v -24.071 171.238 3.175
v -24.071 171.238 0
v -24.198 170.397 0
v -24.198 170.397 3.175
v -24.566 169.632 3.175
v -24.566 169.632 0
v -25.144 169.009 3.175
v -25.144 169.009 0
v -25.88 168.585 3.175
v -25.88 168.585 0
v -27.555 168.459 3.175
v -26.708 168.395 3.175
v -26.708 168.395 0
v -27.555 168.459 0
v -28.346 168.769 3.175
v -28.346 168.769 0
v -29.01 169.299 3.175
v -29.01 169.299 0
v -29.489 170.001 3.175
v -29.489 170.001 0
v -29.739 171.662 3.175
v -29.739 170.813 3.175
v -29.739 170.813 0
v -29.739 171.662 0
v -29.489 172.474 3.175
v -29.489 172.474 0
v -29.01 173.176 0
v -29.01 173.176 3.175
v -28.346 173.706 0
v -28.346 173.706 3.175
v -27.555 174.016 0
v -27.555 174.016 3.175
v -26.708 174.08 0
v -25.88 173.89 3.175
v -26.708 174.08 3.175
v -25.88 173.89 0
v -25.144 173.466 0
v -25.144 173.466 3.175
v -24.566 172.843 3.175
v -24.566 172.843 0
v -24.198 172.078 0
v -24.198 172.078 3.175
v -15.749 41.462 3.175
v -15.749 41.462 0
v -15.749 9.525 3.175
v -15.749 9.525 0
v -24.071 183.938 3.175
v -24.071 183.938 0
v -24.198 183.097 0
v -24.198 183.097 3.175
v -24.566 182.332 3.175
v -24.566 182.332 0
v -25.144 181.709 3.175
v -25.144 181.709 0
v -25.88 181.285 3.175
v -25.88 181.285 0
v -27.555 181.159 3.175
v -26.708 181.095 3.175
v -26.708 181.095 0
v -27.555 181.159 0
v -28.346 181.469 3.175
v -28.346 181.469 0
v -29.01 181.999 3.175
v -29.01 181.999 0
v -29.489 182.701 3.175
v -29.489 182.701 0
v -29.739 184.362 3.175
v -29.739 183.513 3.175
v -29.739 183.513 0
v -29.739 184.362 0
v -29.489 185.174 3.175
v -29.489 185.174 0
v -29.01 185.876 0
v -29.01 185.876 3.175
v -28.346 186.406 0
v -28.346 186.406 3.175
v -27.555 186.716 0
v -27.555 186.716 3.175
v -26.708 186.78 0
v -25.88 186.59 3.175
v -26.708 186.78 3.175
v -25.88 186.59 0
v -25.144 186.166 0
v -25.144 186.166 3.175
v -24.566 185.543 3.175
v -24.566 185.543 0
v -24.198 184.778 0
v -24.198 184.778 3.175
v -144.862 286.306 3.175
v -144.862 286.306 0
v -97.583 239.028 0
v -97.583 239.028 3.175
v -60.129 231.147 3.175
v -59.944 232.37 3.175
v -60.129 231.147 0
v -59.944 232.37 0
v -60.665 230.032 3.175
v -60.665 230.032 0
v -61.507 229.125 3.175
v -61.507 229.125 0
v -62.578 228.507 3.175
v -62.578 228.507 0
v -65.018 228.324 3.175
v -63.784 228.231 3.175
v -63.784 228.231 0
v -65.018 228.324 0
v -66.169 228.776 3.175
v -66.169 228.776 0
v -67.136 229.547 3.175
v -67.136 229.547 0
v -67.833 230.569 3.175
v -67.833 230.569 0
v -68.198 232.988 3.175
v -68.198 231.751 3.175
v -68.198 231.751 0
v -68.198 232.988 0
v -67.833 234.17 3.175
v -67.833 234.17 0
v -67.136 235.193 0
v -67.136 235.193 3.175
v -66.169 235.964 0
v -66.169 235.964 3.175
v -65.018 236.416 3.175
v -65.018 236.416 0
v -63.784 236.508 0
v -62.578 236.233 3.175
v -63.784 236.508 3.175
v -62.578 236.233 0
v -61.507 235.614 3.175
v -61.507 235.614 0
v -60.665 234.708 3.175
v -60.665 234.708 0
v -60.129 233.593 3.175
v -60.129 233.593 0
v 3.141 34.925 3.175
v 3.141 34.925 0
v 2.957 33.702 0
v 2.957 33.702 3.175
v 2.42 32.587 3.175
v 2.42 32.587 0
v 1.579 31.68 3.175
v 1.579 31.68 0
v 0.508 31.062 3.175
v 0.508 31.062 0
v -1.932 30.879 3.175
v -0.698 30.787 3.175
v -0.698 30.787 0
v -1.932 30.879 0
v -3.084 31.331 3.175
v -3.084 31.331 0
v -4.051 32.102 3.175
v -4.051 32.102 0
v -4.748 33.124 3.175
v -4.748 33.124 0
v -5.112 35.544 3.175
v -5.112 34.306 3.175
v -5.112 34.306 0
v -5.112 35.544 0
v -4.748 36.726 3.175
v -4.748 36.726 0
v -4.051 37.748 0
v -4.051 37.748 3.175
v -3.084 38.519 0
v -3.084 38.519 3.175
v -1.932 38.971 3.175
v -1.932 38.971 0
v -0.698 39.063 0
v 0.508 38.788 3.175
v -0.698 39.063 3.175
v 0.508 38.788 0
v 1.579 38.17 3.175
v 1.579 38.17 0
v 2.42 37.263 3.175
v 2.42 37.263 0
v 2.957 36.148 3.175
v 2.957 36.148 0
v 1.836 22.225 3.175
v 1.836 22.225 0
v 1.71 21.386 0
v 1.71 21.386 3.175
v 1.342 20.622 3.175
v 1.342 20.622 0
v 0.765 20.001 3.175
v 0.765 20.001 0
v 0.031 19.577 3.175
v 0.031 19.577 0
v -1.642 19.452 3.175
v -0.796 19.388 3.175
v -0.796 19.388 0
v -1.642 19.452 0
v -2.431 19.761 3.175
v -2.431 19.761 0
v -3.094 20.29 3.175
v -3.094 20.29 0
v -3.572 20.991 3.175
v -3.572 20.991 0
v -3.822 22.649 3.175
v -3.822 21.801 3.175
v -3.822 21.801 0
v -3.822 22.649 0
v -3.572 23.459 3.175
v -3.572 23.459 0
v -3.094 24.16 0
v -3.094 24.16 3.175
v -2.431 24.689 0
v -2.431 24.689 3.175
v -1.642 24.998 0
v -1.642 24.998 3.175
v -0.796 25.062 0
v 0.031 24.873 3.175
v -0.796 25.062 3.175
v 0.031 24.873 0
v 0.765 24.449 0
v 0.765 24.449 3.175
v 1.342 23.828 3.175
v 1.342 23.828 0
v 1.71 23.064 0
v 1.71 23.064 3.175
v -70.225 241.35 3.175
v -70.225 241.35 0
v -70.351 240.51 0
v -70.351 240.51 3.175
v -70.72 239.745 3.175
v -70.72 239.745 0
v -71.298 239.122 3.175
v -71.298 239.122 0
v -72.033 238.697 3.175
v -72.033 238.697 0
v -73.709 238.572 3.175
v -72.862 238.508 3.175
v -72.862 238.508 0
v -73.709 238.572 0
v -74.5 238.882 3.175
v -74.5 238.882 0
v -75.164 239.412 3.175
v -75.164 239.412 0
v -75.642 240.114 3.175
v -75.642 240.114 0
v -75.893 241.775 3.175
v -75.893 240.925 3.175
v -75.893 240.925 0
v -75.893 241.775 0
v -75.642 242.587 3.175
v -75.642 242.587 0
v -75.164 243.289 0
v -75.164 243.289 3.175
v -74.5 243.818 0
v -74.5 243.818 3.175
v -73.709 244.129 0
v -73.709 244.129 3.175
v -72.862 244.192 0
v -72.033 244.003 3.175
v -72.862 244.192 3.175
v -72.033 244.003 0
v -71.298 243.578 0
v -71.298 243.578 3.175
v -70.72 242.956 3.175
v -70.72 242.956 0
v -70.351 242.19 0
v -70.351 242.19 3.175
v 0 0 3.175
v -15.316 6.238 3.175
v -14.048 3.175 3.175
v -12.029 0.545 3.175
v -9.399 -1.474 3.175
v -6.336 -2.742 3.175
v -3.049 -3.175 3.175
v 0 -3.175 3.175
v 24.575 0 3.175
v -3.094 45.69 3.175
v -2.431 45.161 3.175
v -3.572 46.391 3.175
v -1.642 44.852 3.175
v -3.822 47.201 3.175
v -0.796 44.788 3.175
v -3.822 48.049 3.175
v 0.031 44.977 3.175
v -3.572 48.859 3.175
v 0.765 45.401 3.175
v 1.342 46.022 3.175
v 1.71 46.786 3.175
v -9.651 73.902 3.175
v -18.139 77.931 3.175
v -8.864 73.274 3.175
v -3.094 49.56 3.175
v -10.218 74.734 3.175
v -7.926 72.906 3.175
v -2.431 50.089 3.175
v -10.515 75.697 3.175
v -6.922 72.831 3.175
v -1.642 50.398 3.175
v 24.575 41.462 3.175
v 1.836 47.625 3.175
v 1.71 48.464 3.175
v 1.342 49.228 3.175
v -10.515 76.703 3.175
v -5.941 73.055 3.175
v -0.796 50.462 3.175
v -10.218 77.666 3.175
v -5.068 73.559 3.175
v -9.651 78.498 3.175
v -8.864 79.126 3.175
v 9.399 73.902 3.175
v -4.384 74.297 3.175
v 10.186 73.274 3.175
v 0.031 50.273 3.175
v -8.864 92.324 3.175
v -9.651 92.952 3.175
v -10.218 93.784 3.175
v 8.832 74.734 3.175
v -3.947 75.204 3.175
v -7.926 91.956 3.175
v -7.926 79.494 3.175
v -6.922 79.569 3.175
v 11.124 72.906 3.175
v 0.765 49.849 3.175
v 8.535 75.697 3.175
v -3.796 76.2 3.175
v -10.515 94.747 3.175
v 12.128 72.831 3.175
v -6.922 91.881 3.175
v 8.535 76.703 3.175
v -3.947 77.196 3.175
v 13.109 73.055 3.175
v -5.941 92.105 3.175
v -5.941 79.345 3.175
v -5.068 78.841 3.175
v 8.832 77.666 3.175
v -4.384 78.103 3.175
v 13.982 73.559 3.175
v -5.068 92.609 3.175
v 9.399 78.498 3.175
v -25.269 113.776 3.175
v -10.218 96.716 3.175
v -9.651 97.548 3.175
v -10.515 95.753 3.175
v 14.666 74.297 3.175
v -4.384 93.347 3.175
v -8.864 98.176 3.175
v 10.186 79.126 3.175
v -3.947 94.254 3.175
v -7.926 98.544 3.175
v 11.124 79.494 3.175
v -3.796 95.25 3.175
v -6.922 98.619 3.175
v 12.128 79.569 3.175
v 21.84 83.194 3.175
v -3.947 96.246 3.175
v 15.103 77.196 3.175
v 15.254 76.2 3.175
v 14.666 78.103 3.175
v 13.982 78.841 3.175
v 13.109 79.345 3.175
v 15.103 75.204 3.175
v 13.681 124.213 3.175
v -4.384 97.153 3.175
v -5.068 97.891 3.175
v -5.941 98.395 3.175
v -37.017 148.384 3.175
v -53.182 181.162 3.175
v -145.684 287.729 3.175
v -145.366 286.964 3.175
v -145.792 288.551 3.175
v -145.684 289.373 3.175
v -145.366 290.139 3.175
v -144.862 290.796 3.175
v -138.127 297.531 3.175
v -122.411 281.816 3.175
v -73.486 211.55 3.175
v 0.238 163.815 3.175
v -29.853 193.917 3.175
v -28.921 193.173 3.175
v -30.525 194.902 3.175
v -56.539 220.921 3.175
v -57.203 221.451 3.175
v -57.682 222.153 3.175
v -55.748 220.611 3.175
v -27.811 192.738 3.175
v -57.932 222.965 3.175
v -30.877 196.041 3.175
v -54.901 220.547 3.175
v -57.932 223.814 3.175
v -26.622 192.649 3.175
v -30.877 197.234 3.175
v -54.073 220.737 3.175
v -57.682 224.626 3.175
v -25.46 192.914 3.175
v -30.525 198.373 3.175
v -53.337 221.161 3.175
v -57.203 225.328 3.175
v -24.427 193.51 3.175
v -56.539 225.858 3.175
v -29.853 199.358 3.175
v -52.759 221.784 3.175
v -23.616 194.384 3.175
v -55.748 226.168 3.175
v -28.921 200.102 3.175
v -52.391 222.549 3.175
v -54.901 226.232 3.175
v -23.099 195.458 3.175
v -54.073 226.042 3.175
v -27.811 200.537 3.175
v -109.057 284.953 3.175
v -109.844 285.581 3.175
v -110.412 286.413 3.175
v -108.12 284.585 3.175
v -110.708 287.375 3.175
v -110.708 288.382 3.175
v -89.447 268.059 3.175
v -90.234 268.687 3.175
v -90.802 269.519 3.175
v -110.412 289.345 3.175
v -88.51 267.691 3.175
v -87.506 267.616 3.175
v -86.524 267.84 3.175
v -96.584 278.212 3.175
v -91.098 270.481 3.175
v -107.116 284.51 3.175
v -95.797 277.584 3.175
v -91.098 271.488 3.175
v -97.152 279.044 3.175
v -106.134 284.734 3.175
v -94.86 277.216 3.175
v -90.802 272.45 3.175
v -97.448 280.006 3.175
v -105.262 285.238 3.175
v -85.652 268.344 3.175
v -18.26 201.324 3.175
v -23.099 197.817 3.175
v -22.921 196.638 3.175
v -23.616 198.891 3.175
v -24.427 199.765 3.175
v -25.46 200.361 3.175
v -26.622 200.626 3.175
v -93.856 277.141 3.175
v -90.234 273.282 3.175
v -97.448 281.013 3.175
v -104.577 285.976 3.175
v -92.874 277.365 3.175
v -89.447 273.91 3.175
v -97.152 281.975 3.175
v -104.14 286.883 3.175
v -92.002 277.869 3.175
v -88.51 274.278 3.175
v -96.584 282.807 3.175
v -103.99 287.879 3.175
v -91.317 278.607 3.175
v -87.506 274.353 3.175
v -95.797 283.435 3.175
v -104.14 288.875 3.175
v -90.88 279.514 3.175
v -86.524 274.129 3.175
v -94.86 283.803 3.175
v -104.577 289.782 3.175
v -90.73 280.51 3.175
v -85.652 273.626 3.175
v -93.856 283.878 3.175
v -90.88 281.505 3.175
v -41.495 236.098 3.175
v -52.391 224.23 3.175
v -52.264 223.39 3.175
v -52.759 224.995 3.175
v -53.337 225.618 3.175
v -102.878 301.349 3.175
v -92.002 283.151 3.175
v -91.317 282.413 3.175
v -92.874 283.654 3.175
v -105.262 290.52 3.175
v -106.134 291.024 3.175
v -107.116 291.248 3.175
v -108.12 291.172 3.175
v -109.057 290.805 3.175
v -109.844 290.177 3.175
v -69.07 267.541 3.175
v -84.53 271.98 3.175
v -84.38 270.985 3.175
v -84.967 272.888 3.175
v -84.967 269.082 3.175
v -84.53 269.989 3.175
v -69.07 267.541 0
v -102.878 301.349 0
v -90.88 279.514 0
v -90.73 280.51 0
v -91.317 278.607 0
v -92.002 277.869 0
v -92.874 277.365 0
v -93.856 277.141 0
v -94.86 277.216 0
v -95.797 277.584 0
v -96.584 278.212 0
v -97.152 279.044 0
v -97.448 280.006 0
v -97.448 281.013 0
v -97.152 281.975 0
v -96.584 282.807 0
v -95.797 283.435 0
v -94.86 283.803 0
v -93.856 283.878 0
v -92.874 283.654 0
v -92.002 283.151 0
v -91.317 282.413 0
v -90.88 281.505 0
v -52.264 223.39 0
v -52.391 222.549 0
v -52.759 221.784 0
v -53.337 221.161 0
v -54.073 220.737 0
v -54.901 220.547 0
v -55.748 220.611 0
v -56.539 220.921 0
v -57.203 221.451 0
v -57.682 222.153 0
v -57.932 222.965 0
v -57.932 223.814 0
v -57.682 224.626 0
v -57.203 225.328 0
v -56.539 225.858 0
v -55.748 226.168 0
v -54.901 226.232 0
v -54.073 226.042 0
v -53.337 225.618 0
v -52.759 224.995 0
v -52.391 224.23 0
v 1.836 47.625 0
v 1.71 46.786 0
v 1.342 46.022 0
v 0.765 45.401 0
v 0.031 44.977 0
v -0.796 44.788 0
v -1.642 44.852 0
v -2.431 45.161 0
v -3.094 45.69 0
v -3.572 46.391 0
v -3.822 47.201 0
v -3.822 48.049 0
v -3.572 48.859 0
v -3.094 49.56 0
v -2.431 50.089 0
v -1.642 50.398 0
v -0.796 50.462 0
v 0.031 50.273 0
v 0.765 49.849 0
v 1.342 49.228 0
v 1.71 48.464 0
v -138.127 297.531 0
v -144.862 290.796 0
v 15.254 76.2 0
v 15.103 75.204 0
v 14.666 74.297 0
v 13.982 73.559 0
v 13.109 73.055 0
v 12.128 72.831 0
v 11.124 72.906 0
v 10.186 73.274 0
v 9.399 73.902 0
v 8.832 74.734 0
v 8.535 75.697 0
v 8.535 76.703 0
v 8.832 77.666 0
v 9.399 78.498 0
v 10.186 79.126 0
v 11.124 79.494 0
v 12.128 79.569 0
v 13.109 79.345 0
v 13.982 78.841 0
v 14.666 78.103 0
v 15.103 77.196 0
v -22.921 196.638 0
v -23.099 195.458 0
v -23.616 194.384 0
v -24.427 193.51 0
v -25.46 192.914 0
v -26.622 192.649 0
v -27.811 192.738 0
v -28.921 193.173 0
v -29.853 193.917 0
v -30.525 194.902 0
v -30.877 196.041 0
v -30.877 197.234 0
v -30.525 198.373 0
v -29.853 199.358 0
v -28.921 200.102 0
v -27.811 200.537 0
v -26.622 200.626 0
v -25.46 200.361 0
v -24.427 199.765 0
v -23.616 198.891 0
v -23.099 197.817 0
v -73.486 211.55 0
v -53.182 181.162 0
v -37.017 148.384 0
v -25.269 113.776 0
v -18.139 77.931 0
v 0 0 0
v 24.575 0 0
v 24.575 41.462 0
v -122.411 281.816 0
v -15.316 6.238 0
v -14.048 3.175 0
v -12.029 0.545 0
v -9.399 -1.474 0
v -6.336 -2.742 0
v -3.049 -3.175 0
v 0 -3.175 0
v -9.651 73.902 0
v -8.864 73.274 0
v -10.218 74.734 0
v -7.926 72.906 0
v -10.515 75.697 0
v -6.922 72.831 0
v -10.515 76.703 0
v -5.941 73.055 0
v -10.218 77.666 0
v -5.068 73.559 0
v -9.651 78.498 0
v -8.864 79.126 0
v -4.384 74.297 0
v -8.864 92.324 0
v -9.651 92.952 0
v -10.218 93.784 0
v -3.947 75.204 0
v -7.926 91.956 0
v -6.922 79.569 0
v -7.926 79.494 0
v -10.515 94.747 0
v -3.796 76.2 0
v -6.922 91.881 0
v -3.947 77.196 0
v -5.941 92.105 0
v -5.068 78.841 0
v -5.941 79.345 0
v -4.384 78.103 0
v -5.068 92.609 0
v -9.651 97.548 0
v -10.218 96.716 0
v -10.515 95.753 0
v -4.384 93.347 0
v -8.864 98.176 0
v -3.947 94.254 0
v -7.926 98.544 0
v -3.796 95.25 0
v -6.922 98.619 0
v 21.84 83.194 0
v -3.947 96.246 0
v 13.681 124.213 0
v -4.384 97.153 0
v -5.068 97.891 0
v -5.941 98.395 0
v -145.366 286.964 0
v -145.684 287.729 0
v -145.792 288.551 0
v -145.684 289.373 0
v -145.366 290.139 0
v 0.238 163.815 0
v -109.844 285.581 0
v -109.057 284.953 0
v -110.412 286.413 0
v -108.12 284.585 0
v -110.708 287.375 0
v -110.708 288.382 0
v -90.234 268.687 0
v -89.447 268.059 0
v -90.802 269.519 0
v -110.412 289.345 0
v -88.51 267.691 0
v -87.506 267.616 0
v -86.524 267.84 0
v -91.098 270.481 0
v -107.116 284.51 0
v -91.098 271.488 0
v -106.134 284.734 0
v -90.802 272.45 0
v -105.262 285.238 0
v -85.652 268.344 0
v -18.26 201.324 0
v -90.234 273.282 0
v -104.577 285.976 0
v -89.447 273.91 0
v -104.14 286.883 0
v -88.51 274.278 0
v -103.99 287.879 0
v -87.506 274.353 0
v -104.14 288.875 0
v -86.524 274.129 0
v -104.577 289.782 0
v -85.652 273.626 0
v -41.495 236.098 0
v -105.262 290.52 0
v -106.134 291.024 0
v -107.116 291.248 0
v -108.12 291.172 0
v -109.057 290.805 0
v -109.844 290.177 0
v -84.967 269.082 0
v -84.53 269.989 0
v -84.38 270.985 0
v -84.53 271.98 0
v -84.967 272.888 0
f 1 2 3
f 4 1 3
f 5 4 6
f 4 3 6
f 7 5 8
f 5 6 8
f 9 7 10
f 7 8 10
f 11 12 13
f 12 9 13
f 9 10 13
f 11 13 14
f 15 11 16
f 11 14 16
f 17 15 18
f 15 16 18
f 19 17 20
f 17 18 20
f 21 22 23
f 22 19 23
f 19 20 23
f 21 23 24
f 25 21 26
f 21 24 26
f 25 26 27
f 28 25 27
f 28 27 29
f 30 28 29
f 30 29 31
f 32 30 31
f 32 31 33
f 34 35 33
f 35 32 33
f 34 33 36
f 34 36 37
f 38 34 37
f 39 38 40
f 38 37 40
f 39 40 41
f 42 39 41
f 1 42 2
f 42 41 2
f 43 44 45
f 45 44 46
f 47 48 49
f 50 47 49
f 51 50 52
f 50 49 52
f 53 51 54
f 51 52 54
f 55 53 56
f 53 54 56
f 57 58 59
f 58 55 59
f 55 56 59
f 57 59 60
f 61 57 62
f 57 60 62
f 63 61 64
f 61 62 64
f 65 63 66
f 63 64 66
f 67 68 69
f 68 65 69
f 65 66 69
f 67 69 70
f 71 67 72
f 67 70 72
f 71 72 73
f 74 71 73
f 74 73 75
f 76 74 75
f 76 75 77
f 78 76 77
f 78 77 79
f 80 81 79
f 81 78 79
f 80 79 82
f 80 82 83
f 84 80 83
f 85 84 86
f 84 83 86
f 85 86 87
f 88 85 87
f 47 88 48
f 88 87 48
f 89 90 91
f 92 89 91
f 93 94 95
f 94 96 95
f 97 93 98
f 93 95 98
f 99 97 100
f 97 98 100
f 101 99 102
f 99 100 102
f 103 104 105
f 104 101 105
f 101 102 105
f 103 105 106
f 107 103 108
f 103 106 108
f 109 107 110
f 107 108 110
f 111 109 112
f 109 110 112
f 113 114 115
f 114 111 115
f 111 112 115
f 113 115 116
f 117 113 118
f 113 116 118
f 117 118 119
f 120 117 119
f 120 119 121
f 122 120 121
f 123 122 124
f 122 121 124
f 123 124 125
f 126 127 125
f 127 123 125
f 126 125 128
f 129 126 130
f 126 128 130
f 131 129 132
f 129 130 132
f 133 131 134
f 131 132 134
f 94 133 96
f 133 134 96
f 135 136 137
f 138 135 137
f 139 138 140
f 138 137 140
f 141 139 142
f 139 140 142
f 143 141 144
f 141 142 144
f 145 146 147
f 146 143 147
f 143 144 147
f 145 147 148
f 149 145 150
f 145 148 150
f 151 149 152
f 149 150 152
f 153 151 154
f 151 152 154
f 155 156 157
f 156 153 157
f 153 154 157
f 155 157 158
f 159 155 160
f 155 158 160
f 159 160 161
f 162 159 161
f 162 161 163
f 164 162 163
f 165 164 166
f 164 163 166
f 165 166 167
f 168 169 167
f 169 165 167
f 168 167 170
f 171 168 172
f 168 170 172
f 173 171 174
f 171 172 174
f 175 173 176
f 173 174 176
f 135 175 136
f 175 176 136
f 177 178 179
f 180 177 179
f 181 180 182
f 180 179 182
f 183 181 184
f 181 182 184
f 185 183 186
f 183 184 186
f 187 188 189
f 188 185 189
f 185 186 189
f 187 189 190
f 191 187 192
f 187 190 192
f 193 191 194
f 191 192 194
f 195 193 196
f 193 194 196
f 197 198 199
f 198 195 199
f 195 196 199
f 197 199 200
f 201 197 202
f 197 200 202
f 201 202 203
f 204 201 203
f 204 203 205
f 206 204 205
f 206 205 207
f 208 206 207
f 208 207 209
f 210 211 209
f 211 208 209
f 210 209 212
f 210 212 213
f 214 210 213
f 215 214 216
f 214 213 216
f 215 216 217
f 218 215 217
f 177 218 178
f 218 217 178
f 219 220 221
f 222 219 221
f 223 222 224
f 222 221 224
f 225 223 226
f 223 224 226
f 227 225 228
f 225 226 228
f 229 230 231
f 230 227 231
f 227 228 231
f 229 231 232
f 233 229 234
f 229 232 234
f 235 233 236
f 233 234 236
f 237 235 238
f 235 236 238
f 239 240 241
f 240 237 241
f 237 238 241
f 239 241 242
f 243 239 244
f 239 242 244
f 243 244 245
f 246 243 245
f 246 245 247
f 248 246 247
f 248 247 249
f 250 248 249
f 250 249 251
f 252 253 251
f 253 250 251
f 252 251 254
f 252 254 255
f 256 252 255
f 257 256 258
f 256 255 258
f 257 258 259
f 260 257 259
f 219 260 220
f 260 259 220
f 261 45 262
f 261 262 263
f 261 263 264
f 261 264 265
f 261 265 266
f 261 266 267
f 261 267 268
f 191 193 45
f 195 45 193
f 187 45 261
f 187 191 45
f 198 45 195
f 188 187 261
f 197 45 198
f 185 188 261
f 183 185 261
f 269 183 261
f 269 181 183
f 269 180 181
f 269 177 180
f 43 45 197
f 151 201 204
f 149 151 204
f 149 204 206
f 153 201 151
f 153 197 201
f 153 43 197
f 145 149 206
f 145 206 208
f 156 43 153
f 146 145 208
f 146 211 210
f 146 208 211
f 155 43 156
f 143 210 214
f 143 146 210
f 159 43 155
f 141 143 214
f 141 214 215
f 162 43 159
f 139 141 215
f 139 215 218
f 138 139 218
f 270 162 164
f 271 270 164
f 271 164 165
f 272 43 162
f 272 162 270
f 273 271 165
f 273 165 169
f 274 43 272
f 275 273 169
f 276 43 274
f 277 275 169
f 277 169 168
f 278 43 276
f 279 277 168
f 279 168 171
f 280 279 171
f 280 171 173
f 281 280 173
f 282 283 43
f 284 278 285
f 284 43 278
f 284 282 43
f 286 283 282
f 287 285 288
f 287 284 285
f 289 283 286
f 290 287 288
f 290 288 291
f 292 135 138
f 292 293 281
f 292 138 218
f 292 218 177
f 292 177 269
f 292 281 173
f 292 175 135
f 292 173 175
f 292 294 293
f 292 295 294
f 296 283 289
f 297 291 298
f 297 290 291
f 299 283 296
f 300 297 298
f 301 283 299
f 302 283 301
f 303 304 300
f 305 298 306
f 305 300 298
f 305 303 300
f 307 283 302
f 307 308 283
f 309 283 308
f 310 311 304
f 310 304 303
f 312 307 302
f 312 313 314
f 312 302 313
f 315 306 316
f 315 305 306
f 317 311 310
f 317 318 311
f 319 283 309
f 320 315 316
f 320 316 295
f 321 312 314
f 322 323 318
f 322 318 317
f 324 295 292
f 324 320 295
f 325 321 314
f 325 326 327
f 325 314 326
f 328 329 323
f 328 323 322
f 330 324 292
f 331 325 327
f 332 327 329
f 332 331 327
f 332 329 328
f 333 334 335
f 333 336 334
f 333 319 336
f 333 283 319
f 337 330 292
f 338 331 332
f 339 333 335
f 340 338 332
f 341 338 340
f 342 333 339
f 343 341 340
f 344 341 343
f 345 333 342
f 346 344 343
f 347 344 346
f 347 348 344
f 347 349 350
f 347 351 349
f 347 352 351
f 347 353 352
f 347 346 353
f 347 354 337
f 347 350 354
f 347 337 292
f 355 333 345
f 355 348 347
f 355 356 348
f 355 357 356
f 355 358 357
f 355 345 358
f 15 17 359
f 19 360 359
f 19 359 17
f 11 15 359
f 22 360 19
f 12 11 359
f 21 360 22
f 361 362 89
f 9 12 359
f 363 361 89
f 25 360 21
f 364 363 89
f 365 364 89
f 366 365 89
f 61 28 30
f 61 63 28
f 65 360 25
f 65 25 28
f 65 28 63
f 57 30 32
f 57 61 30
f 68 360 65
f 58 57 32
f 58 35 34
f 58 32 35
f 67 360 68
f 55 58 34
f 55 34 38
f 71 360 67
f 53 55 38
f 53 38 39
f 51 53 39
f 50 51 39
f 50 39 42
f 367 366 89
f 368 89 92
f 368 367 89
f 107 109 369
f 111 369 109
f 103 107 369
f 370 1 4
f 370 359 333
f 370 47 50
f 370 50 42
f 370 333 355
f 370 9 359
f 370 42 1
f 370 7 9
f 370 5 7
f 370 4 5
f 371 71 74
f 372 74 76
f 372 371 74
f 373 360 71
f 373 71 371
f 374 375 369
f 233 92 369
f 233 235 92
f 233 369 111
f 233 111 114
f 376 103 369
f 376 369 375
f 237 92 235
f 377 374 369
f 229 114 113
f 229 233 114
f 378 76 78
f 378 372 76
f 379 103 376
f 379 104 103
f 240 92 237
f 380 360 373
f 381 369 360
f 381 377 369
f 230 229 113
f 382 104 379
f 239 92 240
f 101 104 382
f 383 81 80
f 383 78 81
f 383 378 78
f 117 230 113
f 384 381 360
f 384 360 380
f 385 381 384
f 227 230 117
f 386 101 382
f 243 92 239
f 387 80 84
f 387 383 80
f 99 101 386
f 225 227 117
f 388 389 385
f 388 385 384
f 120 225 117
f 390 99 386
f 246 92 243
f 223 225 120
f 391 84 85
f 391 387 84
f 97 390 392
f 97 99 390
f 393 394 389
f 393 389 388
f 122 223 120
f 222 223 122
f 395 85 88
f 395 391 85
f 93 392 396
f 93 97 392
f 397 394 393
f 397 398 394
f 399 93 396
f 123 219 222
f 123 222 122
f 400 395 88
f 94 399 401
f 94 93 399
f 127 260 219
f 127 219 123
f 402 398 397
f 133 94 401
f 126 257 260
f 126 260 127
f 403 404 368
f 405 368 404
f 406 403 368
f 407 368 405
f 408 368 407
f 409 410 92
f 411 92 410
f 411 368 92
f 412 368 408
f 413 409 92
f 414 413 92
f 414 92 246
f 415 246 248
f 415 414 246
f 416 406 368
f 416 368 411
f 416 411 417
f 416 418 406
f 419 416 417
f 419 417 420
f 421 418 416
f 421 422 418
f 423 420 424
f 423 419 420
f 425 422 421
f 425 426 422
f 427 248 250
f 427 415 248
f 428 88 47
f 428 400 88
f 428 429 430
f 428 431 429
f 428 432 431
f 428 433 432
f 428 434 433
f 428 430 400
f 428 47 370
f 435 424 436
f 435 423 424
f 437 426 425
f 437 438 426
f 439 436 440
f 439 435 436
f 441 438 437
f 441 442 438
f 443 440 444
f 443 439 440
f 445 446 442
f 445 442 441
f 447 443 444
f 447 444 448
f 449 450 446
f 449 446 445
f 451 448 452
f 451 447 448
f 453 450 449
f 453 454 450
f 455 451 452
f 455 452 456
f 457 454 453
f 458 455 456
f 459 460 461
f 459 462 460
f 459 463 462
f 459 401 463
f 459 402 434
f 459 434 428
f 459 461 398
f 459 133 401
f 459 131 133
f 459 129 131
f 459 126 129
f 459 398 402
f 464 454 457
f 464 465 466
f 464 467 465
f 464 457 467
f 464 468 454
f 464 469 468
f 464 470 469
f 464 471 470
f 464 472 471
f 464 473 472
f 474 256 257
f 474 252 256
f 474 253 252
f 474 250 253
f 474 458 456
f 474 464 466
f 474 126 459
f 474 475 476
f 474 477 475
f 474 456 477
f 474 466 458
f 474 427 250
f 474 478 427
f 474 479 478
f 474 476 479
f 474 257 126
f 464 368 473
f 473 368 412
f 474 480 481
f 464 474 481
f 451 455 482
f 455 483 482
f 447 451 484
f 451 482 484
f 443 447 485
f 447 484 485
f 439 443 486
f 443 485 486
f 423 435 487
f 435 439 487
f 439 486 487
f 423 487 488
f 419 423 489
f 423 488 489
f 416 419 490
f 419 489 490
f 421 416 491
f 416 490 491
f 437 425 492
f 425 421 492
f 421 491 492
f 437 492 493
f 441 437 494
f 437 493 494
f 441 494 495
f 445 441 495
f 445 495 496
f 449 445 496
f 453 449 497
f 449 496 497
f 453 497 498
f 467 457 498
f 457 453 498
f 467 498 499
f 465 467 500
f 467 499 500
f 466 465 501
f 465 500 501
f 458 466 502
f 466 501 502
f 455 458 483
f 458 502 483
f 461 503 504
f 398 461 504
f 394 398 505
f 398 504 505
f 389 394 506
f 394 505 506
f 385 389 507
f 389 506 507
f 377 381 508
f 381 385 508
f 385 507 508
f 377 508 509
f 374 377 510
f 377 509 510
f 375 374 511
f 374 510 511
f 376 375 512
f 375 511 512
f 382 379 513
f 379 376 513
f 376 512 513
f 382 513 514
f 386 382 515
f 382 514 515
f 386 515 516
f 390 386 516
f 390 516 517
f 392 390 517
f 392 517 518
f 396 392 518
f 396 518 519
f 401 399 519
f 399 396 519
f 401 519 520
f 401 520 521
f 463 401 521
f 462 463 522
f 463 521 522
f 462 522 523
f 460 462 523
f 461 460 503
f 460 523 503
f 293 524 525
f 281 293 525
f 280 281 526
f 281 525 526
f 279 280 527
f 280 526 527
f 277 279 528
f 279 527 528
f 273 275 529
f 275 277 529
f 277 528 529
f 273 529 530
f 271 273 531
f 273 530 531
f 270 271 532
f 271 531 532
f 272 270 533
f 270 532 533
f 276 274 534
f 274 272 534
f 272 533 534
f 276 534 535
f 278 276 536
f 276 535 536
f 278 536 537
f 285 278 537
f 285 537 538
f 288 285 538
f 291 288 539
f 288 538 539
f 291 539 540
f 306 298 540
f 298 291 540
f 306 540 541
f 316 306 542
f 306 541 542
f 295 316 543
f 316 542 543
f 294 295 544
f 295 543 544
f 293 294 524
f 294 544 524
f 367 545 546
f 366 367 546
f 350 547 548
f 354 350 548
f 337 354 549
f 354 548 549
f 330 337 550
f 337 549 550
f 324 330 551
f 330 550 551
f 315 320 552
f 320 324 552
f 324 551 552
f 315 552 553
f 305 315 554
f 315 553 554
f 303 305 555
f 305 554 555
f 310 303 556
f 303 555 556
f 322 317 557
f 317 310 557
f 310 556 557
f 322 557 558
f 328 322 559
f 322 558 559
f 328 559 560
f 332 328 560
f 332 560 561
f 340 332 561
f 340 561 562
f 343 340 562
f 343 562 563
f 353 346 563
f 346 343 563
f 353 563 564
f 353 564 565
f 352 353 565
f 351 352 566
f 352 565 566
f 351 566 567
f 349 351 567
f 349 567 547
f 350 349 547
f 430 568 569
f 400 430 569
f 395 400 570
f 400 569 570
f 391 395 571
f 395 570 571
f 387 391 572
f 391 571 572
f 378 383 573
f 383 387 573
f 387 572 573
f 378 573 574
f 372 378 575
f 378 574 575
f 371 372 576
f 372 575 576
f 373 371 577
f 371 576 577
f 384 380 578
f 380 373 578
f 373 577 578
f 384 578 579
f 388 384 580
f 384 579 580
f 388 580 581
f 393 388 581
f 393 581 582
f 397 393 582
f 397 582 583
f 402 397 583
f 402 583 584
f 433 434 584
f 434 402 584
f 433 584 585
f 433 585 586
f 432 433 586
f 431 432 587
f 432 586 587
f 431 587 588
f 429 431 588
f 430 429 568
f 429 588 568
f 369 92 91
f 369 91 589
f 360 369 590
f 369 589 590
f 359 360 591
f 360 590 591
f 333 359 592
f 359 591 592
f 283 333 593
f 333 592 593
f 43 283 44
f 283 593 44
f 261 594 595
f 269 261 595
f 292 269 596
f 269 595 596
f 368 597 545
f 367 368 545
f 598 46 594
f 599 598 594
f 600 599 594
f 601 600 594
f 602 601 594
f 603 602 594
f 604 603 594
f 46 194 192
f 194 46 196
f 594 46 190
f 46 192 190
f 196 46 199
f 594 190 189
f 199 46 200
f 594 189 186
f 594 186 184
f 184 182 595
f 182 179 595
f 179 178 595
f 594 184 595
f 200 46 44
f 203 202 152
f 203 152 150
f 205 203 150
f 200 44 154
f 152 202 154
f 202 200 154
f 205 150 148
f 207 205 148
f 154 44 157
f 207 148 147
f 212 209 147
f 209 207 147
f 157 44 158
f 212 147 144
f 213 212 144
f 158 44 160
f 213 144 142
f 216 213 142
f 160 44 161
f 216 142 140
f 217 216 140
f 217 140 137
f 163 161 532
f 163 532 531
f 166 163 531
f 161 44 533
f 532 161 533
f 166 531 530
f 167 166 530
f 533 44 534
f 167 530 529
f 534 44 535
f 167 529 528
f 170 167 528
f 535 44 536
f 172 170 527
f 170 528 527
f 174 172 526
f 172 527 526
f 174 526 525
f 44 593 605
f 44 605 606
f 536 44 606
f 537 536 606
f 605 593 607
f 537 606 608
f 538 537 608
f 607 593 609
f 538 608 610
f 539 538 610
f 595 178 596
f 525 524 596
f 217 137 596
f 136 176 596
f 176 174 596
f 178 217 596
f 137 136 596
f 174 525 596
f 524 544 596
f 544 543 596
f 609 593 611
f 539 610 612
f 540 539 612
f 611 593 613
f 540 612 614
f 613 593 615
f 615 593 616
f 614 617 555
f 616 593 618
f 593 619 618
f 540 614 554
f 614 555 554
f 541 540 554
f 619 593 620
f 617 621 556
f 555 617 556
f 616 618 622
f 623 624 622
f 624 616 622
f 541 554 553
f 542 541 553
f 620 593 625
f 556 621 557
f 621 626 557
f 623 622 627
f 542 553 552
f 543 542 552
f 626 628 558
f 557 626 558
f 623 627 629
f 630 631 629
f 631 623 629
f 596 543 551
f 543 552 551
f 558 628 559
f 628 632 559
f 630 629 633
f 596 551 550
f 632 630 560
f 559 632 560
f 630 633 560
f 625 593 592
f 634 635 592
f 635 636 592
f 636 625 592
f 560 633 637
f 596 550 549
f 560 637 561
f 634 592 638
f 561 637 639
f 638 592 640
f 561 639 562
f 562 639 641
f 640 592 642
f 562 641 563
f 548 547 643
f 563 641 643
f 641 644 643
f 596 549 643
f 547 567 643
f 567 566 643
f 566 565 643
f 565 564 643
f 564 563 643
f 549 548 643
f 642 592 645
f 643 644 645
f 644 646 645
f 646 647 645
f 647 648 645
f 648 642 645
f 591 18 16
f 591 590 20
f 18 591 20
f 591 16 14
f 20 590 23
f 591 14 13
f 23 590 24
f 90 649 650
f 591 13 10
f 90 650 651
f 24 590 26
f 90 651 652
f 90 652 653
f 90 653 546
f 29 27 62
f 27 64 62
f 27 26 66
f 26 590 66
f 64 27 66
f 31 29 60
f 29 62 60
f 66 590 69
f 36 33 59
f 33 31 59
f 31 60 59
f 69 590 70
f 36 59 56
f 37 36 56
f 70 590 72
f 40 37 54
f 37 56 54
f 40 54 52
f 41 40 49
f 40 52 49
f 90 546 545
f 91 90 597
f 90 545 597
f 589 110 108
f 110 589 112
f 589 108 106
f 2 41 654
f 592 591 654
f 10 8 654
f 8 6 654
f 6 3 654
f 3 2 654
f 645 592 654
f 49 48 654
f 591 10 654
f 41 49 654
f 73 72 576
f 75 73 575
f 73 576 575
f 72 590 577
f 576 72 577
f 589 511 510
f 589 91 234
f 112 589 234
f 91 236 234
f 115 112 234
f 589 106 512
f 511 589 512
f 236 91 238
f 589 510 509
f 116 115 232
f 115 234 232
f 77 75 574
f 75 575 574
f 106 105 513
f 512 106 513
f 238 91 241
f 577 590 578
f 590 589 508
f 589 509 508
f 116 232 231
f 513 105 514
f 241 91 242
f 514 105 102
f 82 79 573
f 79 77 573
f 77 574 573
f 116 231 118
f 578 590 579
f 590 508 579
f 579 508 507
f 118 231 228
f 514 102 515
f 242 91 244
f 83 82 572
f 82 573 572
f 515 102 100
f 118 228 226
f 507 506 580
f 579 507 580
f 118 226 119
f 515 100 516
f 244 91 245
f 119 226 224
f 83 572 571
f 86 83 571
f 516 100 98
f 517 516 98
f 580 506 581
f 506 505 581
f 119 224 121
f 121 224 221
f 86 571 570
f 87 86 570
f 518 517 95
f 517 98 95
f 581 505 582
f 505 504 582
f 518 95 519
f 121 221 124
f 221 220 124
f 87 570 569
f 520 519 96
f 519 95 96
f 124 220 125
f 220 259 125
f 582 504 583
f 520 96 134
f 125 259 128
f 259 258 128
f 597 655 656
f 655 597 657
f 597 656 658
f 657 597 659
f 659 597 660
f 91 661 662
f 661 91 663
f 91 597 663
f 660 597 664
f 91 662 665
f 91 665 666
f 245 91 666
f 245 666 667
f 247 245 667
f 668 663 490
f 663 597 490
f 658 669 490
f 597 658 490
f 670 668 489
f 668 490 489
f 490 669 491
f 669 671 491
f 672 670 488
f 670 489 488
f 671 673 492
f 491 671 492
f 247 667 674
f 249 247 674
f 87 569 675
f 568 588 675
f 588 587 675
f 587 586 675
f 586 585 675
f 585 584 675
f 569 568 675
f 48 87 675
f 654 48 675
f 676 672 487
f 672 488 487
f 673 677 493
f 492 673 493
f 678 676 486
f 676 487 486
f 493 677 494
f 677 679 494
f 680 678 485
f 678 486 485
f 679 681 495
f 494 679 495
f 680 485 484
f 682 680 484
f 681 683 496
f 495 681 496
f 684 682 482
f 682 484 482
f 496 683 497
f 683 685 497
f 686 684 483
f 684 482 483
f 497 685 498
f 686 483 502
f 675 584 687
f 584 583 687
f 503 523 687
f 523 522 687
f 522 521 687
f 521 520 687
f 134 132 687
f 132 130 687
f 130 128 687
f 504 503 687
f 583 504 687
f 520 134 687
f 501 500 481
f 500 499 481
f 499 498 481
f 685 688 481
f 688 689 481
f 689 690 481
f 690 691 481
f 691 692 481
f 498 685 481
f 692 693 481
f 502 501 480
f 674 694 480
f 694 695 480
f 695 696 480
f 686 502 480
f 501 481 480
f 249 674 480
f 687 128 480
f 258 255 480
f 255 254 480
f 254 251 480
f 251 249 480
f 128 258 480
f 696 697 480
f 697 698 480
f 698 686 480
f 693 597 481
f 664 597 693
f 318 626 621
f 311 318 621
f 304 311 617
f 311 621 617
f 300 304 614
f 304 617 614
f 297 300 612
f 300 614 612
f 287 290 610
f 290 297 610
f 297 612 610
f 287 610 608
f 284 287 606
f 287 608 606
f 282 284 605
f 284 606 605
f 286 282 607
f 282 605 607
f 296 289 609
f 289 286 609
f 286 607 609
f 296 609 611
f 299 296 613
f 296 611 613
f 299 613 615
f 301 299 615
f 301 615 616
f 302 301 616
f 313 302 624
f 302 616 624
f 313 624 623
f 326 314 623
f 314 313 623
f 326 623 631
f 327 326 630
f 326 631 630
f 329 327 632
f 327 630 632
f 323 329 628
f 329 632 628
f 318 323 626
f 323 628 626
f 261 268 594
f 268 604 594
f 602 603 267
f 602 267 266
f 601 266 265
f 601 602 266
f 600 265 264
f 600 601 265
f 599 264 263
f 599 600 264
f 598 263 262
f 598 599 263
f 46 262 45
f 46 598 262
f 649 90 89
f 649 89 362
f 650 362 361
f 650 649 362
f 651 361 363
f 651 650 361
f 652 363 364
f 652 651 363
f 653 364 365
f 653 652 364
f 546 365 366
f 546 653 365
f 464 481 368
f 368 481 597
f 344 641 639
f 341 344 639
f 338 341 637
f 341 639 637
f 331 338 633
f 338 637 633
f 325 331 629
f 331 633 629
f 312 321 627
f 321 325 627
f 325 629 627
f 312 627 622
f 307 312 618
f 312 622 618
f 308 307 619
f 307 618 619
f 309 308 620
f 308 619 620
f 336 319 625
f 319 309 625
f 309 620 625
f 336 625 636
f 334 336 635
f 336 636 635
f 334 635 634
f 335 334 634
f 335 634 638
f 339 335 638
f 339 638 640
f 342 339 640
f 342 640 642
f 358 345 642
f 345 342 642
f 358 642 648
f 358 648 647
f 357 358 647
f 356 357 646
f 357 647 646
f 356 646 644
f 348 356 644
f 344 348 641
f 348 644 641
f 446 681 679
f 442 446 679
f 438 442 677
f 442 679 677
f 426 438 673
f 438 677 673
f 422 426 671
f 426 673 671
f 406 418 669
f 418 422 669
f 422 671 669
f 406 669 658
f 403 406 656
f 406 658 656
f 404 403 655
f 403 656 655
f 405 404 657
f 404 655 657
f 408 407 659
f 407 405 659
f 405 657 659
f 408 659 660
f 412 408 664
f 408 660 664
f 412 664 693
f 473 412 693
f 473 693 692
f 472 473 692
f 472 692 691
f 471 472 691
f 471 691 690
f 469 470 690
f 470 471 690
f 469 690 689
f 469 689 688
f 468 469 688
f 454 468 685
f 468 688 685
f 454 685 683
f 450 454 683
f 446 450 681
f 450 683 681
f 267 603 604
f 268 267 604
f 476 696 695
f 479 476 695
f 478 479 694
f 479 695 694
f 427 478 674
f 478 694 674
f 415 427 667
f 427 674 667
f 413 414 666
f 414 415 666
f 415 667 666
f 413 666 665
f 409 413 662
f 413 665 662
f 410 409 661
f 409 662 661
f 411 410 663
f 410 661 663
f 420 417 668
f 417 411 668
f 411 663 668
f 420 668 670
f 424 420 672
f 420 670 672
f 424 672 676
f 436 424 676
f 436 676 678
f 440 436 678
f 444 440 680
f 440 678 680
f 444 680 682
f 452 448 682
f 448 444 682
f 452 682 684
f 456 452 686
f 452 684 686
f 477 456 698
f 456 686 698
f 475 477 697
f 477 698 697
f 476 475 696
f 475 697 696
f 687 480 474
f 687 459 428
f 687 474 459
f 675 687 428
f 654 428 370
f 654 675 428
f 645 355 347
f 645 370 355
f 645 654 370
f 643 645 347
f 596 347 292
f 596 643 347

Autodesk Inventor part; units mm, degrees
ref_plane "YZ Plane" through (0, 0, 0) normal (1, 0, 0) x (0, 1, 0)
ref_plane "XZ Plane" through (0, 0, 0) normal (0, 1, 0) x (-1, 0, 0)
ref_plane "XY Plane" through (0, 0, 0) normal (0, 0, 1) x (1, 0, 0)
sketch "Sketch1" plane through (0, 0, 0) normal (0, 0, 1) x (1, 0, 0)
  arc A0 (-15.749, 9.525) -> (-3.049, -3.175) centre (-3.049, 9.525) ccw
  line L0 (-3.049, -3.175) -> (0, -3.175)
  line L1 (0, -3.175) -> (0, 0)
  line L2 (0, 0) -> (24.5753, 0)
  line L3 (24.5753, 0) -> (24.5753, 41.4619)
  arc A1 (24.5753, 41.4619) -> (-69.0697, 267.5412) centre (-295.149, 41.4619) ccw
  line L4 (-69.0697, 267.5412) -> (-102.8779, 301.3493)
  line L5 (-102.8779, 301.3493) -> (-122.4112, 281.816)
  line L6 (-122.4112, 281.816) -> (-138.1267, 297.5314)
  line L7 (-138.1267, 297.5314) -> (-144.8619, 290.7962)
  arc A2 (-144.8619, 290.7962) -> (-144.8619, 286.3061) centre (-142.6168, 288.5511) ccw
  line L8 (-144.8619, 286.3061) -> (-97.5834, 239.0276)
  arc A3 (-15.749, 41.4619) -> (-97.5834, 239.0276) centre (-295.149, 41.4619) ccw
  line L9 (-15.749, 41.4619) -> (-15.749, 9.525)
  circle A4 centre (-1.0086, 22.225) radius 2.8448
  circle A5 centre (-1.0086, 47.625) radius 2.8448
  circle A6 centre (-26.9212, 171.2375) radius 2.85
  circle A7 centre (-26.9212, 183.9375) radius 2.85
  circle A8 centre (-26.9212, 196.6375) radius 4
  circle A9 centre (-73.0746, 241.3501) radius 2.85
  circle A10 centre (-55.1141, 223.3895) radius 2.85
  circle A11 centre (-7.1747, 76.2) radius 3.3782
  circle A12 centre (11.8753, 76.2) radius 3.3782
  circle A13 centre (-7.1747, 95.25) radius 3.3782
  circle A14 centre (-107.368, 287.8789) radius 3.3782
  circle A15 centre (-94.108, 280.5097) radius 3.3782
  circle A16 centre (-87.758, 270.9847) radius 3.3782
  circle A17 centre (-1.0086, 34.925) radius 4.15
  circle A18 centre (-64.0943, 232.3698) radius 4.15
  line L10 (-97.5834, 239.0276) -> (-69.0697, 267.5412) construction
  line L11 (-15.749, 41.4619) -> (24.5753, 41.4619) construction
  line L12 (-1.0086, 47.625) -> (-1.0086, 22.225) construction
  line L13 (-7.1747, 76.2) -> (11.8753, 76.2) construction
  line L14 (-7.1747, 76.2) -> (-7.1747, 95.25) construction
  line L15 (-26.9212, 196.6375) -> (-26.9212, 171.2375) construction
  line L16 (-73.0746, 241.3501) -> (-55.1141, 223.3895) construction
  dimension "d0" = 279.4
  dimension "d1" = 319.7243
  dimension "d2" = 6.7564
  dimension "d3" = 6.7564
  dimension "d4" = 6.7564
  dimension "d5" = 5.7
  dimension "d6" = 8.3
  dimension "d7" = 5.7
  dimension "d8" = 8
  dimension "d9" = 5.7
  dimension "d10" = 5.7
  dimension "d11" = 3.175
  dimension "d12" = 12.7
  dimension "d13" = 22.225
  dimension "d14" = 27.6243
  dimension "d15" = 47.8119
  dimension "d16" = 70.0369
  dimension "d17" = 66.8619
  dimension "d18" = 45
  dimension "d19" = 6.7564
  dimension "d20" = 6.7564
  dimension "d21" = 6.7564
  dimension "d22" = 5.6896
  dimension "d23" = 8.3
  dimension "d24" = 5.6896
  dimension "d25" = 12.7
  dimension "d26" = 3.049
  dimension "d27" = 24.5753
  dimension "d28" = 3.175
  dimension "d29" = 41.4619
  dimension "d30" = 31.9369
  dimension "d32" = 14.7404
  dimension "d33" = 22.225
  dimension "d34" = 34.7381
  dimension "d35" = 19.05
  dimension "d36" = 19.05
  dimension "d37" = 8.5743
  dimension "d38" = 11.1722
  dimension "d39" = 171.2375
  dimension "d40" = 18.9726
  dimension "d41" = 63.5
  dimension "d42" = 6.35
  dimension "d43" = 12.7
  dimension "d44" = 8.5346
  dimension "d46" = 20.9371
  dimension "d48" = 25.4
  dimension "d49" = 25.4
  dimension "d50" = 25.4
  dimension "d53" = 6.35
  dimension "d54" = 9.525
extrude "Extrusion1" add sketch "Sketch1" along normal blind 3.175
properties part number "V5 Shooter Conveyor Plate P1 (45 Deg)" material "Aluminum-6061"
